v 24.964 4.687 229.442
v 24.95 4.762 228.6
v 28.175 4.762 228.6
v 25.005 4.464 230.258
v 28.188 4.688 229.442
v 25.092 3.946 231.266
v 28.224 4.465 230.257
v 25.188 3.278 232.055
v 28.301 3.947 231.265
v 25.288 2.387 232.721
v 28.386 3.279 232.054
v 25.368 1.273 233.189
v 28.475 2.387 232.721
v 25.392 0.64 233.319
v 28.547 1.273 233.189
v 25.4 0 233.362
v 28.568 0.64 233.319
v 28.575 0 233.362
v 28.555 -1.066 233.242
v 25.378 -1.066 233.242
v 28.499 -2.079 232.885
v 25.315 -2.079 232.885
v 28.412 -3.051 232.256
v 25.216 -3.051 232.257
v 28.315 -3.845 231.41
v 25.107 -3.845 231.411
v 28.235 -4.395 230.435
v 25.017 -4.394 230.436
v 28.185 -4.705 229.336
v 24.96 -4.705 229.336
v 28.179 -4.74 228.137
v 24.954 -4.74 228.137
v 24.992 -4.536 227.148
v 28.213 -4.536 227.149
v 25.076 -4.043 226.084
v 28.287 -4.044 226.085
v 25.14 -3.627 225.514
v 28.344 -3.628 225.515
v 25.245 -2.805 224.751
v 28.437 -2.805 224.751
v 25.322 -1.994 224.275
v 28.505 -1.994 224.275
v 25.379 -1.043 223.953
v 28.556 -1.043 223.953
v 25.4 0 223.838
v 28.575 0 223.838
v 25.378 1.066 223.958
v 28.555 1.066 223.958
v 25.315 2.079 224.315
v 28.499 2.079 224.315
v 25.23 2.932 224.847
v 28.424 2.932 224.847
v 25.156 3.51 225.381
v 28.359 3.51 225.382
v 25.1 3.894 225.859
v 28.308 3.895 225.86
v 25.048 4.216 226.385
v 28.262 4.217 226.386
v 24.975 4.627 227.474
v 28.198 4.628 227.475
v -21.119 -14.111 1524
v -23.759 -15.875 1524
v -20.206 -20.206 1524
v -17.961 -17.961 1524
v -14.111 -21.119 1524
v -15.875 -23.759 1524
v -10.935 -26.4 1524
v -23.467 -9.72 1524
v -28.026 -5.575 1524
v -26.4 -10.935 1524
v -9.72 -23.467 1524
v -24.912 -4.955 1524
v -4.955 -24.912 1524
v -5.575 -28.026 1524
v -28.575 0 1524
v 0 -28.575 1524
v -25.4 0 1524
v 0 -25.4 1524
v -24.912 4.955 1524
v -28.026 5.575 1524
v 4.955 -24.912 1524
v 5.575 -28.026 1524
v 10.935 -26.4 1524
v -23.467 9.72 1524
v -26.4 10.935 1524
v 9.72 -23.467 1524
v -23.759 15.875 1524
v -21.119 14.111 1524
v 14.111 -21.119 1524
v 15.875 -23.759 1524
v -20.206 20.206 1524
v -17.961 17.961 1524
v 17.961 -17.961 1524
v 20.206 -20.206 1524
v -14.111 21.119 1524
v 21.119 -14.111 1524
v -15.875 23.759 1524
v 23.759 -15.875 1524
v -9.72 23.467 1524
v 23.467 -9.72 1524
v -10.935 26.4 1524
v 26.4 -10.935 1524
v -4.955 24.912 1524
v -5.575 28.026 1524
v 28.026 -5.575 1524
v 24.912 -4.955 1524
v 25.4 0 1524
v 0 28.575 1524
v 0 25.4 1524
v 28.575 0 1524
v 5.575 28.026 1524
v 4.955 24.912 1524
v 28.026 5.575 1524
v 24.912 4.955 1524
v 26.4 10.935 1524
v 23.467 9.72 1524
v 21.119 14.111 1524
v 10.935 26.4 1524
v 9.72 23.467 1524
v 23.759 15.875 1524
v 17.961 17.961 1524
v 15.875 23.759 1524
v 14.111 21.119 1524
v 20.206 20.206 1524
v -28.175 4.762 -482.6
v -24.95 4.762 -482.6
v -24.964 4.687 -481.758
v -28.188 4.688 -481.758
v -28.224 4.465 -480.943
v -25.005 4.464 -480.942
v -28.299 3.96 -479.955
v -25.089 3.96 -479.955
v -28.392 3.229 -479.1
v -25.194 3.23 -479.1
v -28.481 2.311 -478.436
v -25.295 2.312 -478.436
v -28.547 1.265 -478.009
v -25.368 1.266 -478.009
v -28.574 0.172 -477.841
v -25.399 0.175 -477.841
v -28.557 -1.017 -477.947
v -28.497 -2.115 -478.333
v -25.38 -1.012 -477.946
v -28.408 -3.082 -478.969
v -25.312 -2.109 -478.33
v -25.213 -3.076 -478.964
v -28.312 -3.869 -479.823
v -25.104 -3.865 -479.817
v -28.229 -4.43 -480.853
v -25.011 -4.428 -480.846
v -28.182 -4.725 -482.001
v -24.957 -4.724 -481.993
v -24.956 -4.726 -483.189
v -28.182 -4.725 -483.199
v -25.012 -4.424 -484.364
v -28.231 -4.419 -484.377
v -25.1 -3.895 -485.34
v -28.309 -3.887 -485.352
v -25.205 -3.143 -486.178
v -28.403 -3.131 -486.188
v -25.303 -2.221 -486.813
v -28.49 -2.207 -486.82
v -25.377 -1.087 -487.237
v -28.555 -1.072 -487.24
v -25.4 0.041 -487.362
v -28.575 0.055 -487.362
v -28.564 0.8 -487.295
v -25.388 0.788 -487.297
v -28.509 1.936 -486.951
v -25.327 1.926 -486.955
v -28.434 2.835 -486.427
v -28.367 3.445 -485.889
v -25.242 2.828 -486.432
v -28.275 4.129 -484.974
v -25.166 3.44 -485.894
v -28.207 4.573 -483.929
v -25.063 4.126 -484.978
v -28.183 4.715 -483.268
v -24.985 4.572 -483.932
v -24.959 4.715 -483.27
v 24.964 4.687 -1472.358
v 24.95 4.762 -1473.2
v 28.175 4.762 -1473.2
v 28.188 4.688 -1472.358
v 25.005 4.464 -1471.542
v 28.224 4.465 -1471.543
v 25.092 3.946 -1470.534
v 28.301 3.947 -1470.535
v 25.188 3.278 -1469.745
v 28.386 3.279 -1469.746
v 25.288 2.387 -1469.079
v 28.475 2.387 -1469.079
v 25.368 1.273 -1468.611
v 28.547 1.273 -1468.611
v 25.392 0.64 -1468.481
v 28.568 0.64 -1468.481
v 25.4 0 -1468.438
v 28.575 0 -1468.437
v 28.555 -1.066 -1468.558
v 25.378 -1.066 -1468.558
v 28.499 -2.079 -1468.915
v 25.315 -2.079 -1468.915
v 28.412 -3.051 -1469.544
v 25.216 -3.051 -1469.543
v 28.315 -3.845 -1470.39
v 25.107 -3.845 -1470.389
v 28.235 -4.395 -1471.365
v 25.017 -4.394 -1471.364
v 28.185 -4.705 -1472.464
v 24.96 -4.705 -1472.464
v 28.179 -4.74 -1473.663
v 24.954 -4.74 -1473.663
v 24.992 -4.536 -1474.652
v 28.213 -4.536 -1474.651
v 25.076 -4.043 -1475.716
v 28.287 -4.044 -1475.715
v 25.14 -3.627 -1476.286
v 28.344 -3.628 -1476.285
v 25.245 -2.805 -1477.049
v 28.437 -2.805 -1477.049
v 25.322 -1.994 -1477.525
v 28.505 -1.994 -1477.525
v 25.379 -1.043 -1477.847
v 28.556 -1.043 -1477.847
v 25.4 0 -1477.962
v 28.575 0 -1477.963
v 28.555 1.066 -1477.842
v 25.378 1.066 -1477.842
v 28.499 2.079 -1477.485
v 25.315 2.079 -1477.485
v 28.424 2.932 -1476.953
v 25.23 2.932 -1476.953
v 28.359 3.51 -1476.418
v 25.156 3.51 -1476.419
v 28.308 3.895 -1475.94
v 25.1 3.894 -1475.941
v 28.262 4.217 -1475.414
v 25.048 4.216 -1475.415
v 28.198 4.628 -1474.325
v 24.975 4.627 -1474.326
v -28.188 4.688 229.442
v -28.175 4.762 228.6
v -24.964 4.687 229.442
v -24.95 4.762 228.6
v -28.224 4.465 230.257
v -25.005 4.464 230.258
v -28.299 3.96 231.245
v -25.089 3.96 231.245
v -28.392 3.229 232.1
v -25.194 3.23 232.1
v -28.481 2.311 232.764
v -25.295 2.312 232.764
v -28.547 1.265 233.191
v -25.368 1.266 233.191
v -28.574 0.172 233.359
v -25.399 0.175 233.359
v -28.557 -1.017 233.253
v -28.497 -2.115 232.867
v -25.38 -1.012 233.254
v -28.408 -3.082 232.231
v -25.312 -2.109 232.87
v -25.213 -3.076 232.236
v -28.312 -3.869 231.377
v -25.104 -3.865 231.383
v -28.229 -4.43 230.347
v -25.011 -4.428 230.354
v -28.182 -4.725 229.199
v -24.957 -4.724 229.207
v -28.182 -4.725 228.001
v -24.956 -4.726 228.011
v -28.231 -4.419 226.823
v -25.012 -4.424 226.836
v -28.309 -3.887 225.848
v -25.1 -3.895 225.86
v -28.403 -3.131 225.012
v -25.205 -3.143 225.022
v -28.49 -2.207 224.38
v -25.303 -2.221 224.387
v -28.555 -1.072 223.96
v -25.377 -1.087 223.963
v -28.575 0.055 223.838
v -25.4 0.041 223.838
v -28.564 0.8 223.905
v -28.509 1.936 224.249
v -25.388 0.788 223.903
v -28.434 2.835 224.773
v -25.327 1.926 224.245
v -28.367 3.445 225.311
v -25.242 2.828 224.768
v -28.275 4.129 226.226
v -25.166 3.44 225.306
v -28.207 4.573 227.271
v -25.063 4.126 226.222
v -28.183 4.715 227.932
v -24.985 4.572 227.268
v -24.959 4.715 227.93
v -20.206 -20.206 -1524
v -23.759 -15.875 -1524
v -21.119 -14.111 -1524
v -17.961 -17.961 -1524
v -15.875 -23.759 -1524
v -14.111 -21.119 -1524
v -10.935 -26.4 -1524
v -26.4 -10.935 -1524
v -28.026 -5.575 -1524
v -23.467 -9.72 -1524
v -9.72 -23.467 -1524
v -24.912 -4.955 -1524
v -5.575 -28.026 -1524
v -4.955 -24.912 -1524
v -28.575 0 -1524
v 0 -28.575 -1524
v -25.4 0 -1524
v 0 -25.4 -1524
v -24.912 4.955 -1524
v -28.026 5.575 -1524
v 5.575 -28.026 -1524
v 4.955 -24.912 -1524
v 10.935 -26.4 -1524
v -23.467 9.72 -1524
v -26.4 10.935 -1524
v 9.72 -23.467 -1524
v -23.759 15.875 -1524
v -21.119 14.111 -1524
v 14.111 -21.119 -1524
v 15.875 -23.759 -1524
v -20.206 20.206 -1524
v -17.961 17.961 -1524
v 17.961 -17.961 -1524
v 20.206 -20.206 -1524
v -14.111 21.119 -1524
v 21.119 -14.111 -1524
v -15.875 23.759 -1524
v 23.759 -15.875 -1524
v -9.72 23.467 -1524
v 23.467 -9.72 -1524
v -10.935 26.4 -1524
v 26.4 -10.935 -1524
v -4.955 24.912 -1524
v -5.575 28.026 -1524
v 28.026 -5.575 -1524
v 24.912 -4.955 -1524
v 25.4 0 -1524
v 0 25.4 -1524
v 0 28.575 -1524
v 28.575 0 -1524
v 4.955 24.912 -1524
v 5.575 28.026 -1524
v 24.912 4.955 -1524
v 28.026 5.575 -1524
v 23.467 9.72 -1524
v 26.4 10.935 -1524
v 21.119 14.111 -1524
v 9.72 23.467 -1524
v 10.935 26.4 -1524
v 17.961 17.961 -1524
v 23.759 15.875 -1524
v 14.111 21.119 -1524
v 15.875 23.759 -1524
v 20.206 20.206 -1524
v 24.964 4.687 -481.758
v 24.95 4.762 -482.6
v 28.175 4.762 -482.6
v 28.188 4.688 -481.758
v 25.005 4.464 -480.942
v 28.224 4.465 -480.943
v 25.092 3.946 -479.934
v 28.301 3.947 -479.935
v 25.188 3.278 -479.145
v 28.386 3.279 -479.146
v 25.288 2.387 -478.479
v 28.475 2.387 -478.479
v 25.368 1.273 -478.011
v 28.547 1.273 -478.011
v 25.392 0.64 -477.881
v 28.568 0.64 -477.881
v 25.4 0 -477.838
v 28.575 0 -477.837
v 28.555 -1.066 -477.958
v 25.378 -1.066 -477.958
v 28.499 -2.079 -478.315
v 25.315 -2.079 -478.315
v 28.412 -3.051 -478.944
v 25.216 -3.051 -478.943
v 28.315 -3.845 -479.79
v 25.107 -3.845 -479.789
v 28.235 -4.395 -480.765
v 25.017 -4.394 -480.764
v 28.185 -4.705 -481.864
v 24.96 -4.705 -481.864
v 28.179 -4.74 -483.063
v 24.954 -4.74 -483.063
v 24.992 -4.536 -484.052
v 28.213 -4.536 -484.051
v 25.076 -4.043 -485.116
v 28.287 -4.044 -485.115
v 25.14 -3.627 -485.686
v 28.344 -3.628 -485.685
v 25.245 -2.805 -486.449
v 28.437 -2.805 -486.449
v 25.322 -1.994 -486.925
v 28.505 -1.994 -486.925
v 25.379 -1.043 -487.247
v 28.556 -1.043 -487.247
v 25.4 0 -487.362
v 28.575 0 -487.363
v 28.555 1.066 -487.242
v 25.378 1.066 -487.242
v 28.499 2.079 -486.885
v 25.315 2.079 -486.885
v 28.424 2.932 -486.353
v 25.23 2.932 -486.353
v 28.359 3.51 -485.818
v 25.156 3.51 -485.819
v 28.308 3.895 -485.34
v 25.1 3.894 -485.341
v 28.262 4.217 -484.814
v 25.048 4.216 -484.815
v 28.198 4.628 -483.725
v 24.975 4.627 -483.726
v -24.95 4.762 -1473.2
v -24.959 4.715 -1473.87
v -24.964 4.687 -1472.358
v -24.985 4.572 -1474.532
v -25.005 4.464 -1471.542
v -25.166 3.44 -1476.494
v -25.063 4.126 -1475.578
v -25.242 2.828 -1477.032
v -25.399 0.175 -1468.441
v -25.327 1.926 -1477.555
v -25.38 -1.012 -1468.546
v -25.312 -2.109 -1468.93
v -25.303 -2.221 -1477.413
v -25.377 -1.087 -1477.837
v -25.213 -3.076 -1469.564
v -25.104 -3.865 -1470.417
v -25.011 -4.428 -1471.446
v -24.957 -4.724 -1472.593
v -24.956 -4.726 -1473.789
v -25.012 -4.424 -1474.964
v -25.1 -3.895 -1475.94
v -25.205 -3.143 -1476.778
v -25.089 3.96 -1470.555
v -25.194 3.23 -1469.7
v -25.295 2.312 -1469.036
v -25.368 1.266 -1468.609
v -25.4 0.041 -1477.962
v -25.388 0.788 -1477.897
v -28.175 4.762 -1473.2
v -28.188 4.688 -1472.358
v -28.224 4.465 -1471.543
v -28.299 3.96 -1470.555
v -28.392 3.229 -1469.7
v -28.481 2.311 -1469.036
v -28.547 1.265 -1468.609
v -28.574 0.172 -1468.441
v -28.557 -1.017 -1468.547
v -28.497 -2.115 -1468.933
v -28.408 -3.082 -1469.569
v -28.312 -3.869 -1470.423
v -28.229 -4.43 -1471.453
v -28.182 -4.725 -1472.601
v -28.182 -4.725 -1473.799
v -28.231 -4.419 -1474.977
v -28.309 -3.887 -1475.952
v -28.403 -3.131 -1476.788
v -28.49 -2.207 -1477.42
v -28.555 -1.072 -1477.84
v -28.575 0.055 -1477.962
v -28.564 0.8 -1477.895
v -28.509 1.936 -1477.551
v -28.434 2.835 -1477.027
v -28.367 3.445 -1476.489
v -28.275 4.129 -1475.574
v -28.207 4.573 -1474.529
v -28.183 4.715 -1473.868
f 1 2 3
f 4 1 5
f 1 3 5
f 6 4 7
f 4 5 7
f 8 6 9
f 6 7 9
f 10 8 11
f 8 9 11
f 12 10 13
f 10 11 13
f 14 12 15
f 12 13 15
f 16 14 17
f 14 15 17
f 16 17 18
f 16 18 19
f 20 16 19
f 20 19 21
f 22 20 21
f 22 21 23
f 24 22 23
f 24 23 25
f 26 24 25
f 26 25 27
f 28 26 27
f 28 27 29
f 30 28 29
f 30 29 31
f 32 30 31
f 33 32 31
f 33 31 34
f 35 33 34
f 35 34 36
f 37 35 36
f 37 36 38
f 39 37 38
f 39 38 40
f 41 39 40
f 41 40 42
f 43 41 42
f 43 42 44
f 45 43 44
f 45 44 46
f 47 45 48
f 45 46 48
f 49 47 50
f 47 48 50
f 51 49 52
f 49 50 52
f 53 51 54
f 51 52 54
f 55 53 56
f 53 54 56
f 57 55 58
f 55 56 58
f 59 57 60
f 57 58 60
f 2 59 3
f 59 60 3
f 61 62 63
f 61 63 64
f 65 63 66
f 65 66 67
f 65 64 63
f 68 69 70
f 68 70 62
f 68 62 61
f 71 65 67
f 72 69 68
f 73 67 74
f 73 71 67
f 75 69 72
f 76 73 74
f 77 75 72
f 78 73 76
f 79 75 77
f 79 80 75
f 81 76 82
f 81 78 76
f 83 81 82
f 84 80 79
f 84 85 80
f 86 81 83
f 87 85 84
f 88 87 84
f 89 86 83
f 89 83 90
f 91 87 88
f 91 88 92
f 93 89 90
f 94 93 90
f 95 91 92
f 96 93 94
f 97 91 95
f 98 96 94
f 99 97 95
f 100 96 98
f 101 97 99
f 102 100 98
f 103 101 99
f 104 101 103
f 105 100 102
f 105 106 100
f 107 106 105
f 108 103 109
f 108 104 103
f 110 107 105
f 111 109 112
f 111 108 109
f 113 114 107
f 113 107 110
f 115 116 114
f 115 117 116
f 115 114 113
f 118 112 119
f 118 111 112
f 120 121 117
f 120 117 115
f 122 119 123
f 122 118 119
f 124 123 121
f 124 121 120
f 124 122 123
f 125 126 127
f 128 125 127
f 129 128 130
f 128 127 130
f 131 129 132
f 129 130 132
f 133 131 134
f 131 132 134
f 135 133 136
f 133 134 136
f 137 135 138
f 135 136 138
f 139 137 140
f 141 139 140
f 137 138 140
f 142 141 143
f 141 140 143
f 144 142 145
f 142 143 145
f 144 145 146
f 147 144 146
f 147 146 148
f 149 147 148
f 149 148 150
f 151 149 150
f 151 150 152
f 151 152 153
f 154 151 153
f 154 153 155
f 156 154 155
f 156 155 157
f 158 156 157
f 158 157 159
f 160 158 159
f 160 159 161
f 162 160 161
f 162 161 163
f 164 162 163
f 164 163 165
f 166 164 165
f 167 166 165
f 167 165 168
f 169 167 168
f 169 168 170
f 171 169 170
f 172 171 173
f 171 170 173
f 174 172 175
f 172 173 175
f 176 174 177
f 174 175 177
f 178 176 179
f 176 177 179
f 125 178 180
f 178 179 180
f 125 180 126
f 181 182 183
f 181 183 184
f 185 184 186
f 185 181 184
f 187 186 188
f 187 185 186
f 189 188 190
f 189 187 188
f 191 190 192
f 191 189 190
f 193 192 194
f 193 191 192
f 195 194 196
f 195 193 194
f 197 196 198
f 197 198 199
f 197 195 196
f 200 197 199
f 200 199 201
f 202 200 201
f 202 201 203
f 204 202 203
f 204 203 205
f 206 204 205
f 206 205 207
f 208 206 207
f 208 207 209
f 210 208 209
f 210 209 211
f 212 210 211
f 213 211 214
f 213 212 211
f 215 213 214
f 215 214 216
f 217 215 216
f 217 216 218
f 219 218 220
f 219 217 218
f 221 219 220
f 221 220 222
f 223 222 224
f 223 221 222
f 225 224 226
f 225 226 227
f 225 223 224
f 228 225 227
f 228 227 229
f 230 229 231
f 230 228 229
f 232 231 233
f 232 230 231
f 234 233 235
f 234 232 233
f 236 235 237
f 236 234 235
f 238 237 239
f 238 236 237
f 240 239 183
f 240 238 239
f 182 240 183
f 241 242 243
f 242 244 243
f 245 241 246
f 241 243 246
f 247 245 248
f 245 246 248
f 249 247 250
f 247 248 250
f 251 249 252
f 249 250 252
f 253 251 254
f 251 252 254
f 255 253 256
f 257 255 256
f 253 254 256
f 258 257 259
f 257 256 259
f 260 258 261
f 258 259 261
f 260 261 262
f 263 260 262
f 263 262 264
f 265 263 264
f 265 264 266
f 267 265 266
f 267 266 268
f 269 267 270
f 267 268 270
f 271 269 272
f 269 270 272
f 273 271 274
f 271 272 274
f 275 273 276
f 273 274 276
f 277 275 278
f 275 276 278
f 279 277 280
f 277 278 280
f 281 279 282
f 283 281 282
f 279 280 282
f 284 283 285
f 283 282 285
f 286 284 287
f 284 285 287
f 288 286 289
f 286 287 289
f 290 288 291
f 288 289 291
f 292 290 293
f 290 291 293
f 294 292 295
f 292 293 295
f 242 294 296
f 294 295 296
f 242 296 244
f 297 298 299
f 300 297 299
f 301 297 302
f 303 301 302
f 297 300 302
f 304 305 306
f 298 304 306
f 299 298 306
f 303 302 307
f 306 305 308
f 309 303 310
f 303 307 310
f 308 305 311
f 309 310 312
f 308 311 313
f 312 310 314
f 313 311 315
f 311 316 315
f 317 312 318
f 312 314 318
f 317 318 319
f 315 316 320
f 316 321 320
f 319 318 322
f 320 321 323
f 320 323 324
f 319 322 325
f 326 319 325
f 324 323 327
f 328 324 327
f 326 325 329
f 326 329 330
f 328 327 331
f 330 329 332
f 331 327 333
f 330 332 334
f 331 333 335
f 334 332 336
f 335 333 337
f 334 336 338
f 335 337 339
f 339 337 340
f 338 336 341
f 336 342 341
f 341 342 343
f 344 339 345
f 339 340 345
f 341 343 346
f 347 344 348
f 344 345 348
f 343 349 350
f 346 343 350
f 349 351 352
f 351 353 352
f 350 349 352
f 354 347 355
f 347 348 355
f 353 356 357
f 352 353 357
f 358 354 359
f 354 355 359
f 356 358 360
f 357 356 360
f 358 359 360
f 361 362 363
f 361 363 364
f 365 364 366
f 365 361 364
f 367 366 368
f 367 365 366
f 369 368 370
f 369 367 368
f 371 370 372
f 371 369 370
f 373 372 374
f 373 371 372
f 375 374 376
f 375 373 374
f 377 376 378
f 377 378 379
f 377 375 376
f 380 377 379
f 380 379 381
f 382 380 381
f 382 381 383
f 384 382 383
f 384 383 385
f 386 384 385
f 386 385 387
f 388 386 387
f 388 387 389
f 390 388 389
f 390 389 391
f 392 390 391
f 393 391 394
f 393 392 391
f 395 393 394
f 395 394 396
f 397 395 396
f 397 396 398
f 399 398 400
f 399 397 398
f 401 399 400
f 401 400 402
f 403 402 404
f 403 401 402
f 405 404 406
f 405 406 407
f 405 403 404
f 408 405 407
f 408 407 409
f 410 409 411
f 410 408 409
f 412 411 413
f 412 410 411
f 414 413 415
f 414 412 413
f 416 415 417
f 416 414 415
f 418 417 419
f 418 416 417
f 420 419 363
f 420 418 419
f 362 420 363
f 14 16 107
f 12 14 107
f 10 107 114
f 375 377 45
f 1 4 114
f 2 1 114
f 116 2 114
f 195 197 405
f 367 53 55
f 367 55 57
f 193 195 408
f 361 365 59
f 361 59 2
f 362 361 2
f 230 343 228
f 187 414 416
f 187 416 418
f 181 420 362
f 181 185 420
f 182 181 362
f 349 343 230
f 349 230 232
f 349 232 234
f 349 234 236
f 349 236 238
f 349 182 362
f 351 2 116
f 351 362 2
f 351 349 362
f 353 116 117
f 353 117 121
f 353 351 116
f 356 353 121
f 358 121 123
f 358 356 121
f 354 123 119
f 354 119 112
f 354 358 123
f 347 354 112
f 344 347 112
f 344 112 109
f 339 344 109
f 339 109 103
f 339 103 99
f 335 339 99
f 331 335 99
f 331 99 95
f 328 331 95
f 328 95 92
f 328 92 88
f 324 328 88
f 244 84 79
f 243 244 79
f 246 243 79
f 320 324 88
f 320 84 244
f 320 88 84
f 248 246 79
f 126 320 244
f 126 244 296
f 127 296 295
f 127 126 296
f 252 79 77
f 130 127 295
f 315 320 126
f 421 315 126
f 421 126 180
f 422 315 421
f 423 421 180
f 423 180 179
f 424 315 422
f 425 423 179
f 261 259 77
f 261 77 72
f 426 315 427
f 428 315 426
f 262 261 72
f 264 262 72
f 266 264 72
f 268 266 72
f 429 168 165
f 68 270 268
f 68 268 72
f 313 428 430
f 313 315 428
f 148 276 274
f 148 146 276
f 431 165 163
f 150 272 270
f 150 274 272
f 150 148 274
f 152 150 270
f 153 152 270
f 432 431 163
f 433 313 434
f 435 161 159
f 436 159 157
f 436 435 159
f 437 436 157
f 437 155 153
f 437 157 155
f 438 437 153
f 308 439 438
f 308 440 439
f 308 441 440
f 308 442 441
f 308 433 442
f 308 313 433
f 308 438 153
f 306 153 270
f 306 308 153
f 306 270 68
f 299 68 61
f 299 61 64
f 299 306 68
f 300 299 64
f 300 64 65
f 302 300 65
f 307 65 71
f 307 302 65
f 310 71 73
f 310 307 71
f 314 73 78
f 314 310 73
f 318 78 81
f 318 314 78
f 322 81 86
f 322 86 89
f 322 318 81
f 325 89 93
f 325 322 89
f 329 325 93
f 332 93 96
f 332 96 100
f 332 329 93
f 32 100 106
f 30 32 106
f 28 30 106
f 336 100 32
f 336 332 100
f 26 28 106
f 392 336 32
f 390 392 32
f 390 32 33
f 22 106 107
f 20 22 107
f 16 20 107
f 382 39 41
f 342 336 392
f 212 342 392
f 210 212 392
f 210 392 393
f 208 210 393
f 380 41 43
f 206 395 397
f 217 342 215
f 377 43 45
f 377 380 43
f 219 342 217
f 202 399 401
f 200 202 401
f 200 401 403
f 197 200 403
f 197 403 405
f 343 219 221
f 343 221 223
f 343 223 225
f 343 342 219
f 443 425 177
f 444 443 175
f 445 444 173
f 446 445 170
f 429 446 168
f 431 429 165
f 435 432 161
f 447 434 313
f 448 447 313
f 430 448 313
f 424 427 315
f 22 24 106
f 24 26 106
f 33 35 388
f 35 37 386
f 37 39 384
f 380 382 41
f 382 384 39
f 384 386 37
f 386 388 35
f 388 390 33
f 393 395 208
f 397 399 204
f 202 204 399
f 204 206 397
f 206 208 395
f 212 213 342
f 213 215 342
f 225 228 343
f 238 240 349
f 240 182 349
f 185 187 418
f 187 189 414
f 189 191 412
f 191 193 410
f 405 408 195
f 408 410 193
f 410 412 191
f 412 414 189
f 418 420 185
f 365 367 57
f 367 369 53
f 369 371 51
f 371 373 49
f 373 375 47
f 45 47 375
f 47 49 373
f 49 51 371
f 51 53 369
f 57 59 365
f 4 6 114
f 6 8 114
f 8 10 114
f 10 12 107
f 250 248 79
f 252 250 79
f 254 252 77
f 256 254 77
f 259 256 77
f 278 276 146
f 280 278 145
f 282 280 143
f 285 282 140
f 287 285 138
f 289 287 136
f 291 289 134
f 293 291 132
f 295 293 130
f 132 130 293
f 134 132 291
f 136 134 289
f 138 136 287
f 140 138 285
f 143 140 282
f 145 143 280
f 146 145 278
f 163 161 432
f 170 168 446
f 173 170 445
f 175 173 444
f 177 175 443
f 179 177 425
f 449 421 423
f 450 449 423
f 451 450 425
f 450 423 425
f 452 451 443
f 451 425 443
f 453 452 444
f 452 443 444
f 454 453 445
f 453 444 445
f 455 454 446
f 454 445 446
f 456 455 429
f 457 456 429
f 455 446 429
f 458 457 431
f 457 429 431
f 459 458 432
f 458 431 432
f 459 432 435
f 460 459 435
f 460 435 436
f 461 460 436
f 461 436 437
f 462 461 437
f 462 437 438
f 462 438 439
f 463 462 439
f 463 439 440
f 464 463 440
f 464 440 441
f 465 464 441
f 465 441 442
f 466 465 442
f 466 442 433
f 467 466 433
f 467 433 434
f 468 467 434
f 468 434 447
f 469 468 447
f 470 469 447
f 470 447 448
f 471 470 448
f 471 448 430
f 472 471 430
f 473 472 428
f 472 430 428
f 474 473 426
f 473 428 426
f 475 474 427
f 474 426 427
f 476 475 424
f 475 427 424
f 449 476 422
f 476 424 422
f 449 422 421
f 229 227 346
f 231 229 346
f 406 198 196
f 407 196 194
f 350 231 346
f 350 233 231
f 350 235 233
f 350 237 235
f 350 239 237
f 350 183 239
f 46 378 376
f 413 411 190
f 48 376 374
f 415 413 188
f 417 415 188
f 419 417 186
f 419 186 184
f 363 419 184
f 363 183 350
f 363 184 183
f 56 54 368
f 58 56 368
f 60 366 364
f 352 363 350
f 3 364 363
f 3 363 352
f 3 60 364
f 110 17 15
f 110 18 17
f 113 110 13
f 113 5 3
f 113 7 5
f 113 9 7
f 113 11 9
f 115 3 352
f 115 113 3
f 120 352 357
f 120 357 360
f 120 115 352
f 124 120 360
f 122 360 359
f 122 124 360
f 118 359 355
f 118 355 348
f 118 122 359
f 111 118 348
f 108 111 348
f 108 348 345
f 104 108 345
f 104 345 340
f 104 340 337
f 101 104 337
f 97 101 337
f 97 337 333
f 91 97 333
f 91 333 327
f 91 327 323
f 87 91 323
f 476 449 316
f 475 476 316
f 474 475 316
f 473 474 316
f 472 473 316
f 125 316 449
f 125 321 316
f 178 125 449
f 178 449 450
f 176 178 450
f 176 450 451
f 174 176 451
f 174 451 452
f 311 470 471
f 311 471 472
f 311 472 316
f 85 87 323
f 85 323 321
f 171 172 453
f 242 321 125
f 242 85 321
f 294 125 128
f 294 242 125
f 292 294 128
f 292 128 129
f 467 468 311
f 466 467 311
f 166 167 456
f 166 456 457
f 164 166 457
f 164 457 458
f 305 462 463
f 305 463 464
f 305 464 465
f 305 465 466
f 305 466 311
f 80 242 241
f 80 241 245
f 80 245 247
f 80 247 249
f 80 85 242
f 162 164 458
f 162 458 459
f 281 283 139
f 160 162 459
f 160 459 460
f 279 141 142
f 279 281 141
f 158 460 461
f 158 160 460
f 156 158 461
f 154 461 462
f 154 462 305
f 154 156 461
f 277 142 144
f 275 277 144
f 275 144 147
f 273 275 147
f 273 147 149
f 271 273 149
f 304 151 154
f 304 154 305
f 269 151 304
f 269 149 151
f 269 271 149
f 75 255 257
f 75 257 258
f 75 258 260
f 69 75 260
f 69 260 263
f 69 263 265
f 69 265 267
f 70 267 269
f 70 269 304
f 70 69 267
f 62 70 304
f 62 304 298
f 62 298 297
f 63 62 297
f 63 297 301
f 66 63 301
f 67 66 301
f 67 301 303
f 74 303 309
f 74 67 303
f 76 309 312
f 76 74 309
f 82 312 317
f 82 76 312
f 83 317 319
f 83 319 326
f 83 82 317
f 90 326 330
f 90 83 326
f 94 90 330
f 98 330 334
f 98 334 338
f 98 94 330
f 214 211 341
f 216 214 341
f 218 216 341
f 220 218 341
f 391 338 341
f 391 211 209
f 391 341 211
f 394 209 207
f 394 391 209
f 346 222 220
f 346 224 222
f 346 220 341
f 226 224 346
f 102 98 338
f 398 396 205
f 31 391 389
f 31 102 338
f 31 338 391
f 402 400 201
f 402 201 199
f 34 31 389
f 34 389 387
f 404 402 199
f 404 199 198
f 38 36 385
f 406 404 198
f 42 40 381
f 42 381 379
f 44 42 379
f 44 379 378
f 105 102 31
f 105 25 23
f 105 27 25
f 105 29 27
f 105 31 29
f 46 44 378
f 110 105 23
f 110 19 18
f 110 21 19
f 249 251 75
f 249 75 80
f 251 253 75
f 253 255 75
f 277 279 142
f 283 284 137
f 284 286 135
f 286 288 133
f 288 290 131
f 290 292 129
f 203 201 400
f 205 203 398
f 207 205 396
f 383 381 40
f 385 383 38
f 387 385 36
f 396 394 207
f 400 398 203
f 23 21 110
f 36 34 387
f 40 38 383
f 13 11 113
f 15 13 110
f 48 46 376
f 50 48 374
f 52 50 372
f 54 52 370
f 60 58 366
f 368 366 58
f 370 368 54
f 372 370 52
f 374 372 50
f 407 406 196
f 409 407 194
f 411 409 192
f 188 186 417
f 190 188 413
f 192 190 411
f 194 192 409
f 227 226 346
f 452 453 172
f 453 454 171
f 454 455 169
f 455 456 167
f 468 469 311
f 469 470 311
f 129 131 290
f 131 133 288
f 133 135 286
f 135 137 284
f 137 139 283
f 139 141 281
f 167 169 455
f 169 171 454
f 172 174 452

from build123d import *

# Parameters (mm, degrees)
F0_R     = 28.575
F0_R_2   = 25.4
F1_DEPTH = 1524
F2_R     = 4.7625
F3_DEPTH = 50.8


with BuildPart() as f1:
    # F0 (on Top) → F1 (new body, symmetric)
    with BuildSketch(Plane.XY):
        Circle(F0_R)
        Circle(F0_R_2, mode=Mode.SUBTRACT)
    extrude(amount=F1_DEPTH, both=True)

    # F2 (on Right) → F3 (cut, symmetric)
    with BuildSketch(Plane.YZ):
        with Locations((0, -1473.2)):
            Circle(F2_R)
        with Locations((0, -482.6)):
            Circle(F2_R)
        with Locations((0, 228.6)):
            Circle(F2_R)
    extrude(amount=F3_DEPTH, both=True, mode=Mode.SUBTRACT)


solid = f1.part
